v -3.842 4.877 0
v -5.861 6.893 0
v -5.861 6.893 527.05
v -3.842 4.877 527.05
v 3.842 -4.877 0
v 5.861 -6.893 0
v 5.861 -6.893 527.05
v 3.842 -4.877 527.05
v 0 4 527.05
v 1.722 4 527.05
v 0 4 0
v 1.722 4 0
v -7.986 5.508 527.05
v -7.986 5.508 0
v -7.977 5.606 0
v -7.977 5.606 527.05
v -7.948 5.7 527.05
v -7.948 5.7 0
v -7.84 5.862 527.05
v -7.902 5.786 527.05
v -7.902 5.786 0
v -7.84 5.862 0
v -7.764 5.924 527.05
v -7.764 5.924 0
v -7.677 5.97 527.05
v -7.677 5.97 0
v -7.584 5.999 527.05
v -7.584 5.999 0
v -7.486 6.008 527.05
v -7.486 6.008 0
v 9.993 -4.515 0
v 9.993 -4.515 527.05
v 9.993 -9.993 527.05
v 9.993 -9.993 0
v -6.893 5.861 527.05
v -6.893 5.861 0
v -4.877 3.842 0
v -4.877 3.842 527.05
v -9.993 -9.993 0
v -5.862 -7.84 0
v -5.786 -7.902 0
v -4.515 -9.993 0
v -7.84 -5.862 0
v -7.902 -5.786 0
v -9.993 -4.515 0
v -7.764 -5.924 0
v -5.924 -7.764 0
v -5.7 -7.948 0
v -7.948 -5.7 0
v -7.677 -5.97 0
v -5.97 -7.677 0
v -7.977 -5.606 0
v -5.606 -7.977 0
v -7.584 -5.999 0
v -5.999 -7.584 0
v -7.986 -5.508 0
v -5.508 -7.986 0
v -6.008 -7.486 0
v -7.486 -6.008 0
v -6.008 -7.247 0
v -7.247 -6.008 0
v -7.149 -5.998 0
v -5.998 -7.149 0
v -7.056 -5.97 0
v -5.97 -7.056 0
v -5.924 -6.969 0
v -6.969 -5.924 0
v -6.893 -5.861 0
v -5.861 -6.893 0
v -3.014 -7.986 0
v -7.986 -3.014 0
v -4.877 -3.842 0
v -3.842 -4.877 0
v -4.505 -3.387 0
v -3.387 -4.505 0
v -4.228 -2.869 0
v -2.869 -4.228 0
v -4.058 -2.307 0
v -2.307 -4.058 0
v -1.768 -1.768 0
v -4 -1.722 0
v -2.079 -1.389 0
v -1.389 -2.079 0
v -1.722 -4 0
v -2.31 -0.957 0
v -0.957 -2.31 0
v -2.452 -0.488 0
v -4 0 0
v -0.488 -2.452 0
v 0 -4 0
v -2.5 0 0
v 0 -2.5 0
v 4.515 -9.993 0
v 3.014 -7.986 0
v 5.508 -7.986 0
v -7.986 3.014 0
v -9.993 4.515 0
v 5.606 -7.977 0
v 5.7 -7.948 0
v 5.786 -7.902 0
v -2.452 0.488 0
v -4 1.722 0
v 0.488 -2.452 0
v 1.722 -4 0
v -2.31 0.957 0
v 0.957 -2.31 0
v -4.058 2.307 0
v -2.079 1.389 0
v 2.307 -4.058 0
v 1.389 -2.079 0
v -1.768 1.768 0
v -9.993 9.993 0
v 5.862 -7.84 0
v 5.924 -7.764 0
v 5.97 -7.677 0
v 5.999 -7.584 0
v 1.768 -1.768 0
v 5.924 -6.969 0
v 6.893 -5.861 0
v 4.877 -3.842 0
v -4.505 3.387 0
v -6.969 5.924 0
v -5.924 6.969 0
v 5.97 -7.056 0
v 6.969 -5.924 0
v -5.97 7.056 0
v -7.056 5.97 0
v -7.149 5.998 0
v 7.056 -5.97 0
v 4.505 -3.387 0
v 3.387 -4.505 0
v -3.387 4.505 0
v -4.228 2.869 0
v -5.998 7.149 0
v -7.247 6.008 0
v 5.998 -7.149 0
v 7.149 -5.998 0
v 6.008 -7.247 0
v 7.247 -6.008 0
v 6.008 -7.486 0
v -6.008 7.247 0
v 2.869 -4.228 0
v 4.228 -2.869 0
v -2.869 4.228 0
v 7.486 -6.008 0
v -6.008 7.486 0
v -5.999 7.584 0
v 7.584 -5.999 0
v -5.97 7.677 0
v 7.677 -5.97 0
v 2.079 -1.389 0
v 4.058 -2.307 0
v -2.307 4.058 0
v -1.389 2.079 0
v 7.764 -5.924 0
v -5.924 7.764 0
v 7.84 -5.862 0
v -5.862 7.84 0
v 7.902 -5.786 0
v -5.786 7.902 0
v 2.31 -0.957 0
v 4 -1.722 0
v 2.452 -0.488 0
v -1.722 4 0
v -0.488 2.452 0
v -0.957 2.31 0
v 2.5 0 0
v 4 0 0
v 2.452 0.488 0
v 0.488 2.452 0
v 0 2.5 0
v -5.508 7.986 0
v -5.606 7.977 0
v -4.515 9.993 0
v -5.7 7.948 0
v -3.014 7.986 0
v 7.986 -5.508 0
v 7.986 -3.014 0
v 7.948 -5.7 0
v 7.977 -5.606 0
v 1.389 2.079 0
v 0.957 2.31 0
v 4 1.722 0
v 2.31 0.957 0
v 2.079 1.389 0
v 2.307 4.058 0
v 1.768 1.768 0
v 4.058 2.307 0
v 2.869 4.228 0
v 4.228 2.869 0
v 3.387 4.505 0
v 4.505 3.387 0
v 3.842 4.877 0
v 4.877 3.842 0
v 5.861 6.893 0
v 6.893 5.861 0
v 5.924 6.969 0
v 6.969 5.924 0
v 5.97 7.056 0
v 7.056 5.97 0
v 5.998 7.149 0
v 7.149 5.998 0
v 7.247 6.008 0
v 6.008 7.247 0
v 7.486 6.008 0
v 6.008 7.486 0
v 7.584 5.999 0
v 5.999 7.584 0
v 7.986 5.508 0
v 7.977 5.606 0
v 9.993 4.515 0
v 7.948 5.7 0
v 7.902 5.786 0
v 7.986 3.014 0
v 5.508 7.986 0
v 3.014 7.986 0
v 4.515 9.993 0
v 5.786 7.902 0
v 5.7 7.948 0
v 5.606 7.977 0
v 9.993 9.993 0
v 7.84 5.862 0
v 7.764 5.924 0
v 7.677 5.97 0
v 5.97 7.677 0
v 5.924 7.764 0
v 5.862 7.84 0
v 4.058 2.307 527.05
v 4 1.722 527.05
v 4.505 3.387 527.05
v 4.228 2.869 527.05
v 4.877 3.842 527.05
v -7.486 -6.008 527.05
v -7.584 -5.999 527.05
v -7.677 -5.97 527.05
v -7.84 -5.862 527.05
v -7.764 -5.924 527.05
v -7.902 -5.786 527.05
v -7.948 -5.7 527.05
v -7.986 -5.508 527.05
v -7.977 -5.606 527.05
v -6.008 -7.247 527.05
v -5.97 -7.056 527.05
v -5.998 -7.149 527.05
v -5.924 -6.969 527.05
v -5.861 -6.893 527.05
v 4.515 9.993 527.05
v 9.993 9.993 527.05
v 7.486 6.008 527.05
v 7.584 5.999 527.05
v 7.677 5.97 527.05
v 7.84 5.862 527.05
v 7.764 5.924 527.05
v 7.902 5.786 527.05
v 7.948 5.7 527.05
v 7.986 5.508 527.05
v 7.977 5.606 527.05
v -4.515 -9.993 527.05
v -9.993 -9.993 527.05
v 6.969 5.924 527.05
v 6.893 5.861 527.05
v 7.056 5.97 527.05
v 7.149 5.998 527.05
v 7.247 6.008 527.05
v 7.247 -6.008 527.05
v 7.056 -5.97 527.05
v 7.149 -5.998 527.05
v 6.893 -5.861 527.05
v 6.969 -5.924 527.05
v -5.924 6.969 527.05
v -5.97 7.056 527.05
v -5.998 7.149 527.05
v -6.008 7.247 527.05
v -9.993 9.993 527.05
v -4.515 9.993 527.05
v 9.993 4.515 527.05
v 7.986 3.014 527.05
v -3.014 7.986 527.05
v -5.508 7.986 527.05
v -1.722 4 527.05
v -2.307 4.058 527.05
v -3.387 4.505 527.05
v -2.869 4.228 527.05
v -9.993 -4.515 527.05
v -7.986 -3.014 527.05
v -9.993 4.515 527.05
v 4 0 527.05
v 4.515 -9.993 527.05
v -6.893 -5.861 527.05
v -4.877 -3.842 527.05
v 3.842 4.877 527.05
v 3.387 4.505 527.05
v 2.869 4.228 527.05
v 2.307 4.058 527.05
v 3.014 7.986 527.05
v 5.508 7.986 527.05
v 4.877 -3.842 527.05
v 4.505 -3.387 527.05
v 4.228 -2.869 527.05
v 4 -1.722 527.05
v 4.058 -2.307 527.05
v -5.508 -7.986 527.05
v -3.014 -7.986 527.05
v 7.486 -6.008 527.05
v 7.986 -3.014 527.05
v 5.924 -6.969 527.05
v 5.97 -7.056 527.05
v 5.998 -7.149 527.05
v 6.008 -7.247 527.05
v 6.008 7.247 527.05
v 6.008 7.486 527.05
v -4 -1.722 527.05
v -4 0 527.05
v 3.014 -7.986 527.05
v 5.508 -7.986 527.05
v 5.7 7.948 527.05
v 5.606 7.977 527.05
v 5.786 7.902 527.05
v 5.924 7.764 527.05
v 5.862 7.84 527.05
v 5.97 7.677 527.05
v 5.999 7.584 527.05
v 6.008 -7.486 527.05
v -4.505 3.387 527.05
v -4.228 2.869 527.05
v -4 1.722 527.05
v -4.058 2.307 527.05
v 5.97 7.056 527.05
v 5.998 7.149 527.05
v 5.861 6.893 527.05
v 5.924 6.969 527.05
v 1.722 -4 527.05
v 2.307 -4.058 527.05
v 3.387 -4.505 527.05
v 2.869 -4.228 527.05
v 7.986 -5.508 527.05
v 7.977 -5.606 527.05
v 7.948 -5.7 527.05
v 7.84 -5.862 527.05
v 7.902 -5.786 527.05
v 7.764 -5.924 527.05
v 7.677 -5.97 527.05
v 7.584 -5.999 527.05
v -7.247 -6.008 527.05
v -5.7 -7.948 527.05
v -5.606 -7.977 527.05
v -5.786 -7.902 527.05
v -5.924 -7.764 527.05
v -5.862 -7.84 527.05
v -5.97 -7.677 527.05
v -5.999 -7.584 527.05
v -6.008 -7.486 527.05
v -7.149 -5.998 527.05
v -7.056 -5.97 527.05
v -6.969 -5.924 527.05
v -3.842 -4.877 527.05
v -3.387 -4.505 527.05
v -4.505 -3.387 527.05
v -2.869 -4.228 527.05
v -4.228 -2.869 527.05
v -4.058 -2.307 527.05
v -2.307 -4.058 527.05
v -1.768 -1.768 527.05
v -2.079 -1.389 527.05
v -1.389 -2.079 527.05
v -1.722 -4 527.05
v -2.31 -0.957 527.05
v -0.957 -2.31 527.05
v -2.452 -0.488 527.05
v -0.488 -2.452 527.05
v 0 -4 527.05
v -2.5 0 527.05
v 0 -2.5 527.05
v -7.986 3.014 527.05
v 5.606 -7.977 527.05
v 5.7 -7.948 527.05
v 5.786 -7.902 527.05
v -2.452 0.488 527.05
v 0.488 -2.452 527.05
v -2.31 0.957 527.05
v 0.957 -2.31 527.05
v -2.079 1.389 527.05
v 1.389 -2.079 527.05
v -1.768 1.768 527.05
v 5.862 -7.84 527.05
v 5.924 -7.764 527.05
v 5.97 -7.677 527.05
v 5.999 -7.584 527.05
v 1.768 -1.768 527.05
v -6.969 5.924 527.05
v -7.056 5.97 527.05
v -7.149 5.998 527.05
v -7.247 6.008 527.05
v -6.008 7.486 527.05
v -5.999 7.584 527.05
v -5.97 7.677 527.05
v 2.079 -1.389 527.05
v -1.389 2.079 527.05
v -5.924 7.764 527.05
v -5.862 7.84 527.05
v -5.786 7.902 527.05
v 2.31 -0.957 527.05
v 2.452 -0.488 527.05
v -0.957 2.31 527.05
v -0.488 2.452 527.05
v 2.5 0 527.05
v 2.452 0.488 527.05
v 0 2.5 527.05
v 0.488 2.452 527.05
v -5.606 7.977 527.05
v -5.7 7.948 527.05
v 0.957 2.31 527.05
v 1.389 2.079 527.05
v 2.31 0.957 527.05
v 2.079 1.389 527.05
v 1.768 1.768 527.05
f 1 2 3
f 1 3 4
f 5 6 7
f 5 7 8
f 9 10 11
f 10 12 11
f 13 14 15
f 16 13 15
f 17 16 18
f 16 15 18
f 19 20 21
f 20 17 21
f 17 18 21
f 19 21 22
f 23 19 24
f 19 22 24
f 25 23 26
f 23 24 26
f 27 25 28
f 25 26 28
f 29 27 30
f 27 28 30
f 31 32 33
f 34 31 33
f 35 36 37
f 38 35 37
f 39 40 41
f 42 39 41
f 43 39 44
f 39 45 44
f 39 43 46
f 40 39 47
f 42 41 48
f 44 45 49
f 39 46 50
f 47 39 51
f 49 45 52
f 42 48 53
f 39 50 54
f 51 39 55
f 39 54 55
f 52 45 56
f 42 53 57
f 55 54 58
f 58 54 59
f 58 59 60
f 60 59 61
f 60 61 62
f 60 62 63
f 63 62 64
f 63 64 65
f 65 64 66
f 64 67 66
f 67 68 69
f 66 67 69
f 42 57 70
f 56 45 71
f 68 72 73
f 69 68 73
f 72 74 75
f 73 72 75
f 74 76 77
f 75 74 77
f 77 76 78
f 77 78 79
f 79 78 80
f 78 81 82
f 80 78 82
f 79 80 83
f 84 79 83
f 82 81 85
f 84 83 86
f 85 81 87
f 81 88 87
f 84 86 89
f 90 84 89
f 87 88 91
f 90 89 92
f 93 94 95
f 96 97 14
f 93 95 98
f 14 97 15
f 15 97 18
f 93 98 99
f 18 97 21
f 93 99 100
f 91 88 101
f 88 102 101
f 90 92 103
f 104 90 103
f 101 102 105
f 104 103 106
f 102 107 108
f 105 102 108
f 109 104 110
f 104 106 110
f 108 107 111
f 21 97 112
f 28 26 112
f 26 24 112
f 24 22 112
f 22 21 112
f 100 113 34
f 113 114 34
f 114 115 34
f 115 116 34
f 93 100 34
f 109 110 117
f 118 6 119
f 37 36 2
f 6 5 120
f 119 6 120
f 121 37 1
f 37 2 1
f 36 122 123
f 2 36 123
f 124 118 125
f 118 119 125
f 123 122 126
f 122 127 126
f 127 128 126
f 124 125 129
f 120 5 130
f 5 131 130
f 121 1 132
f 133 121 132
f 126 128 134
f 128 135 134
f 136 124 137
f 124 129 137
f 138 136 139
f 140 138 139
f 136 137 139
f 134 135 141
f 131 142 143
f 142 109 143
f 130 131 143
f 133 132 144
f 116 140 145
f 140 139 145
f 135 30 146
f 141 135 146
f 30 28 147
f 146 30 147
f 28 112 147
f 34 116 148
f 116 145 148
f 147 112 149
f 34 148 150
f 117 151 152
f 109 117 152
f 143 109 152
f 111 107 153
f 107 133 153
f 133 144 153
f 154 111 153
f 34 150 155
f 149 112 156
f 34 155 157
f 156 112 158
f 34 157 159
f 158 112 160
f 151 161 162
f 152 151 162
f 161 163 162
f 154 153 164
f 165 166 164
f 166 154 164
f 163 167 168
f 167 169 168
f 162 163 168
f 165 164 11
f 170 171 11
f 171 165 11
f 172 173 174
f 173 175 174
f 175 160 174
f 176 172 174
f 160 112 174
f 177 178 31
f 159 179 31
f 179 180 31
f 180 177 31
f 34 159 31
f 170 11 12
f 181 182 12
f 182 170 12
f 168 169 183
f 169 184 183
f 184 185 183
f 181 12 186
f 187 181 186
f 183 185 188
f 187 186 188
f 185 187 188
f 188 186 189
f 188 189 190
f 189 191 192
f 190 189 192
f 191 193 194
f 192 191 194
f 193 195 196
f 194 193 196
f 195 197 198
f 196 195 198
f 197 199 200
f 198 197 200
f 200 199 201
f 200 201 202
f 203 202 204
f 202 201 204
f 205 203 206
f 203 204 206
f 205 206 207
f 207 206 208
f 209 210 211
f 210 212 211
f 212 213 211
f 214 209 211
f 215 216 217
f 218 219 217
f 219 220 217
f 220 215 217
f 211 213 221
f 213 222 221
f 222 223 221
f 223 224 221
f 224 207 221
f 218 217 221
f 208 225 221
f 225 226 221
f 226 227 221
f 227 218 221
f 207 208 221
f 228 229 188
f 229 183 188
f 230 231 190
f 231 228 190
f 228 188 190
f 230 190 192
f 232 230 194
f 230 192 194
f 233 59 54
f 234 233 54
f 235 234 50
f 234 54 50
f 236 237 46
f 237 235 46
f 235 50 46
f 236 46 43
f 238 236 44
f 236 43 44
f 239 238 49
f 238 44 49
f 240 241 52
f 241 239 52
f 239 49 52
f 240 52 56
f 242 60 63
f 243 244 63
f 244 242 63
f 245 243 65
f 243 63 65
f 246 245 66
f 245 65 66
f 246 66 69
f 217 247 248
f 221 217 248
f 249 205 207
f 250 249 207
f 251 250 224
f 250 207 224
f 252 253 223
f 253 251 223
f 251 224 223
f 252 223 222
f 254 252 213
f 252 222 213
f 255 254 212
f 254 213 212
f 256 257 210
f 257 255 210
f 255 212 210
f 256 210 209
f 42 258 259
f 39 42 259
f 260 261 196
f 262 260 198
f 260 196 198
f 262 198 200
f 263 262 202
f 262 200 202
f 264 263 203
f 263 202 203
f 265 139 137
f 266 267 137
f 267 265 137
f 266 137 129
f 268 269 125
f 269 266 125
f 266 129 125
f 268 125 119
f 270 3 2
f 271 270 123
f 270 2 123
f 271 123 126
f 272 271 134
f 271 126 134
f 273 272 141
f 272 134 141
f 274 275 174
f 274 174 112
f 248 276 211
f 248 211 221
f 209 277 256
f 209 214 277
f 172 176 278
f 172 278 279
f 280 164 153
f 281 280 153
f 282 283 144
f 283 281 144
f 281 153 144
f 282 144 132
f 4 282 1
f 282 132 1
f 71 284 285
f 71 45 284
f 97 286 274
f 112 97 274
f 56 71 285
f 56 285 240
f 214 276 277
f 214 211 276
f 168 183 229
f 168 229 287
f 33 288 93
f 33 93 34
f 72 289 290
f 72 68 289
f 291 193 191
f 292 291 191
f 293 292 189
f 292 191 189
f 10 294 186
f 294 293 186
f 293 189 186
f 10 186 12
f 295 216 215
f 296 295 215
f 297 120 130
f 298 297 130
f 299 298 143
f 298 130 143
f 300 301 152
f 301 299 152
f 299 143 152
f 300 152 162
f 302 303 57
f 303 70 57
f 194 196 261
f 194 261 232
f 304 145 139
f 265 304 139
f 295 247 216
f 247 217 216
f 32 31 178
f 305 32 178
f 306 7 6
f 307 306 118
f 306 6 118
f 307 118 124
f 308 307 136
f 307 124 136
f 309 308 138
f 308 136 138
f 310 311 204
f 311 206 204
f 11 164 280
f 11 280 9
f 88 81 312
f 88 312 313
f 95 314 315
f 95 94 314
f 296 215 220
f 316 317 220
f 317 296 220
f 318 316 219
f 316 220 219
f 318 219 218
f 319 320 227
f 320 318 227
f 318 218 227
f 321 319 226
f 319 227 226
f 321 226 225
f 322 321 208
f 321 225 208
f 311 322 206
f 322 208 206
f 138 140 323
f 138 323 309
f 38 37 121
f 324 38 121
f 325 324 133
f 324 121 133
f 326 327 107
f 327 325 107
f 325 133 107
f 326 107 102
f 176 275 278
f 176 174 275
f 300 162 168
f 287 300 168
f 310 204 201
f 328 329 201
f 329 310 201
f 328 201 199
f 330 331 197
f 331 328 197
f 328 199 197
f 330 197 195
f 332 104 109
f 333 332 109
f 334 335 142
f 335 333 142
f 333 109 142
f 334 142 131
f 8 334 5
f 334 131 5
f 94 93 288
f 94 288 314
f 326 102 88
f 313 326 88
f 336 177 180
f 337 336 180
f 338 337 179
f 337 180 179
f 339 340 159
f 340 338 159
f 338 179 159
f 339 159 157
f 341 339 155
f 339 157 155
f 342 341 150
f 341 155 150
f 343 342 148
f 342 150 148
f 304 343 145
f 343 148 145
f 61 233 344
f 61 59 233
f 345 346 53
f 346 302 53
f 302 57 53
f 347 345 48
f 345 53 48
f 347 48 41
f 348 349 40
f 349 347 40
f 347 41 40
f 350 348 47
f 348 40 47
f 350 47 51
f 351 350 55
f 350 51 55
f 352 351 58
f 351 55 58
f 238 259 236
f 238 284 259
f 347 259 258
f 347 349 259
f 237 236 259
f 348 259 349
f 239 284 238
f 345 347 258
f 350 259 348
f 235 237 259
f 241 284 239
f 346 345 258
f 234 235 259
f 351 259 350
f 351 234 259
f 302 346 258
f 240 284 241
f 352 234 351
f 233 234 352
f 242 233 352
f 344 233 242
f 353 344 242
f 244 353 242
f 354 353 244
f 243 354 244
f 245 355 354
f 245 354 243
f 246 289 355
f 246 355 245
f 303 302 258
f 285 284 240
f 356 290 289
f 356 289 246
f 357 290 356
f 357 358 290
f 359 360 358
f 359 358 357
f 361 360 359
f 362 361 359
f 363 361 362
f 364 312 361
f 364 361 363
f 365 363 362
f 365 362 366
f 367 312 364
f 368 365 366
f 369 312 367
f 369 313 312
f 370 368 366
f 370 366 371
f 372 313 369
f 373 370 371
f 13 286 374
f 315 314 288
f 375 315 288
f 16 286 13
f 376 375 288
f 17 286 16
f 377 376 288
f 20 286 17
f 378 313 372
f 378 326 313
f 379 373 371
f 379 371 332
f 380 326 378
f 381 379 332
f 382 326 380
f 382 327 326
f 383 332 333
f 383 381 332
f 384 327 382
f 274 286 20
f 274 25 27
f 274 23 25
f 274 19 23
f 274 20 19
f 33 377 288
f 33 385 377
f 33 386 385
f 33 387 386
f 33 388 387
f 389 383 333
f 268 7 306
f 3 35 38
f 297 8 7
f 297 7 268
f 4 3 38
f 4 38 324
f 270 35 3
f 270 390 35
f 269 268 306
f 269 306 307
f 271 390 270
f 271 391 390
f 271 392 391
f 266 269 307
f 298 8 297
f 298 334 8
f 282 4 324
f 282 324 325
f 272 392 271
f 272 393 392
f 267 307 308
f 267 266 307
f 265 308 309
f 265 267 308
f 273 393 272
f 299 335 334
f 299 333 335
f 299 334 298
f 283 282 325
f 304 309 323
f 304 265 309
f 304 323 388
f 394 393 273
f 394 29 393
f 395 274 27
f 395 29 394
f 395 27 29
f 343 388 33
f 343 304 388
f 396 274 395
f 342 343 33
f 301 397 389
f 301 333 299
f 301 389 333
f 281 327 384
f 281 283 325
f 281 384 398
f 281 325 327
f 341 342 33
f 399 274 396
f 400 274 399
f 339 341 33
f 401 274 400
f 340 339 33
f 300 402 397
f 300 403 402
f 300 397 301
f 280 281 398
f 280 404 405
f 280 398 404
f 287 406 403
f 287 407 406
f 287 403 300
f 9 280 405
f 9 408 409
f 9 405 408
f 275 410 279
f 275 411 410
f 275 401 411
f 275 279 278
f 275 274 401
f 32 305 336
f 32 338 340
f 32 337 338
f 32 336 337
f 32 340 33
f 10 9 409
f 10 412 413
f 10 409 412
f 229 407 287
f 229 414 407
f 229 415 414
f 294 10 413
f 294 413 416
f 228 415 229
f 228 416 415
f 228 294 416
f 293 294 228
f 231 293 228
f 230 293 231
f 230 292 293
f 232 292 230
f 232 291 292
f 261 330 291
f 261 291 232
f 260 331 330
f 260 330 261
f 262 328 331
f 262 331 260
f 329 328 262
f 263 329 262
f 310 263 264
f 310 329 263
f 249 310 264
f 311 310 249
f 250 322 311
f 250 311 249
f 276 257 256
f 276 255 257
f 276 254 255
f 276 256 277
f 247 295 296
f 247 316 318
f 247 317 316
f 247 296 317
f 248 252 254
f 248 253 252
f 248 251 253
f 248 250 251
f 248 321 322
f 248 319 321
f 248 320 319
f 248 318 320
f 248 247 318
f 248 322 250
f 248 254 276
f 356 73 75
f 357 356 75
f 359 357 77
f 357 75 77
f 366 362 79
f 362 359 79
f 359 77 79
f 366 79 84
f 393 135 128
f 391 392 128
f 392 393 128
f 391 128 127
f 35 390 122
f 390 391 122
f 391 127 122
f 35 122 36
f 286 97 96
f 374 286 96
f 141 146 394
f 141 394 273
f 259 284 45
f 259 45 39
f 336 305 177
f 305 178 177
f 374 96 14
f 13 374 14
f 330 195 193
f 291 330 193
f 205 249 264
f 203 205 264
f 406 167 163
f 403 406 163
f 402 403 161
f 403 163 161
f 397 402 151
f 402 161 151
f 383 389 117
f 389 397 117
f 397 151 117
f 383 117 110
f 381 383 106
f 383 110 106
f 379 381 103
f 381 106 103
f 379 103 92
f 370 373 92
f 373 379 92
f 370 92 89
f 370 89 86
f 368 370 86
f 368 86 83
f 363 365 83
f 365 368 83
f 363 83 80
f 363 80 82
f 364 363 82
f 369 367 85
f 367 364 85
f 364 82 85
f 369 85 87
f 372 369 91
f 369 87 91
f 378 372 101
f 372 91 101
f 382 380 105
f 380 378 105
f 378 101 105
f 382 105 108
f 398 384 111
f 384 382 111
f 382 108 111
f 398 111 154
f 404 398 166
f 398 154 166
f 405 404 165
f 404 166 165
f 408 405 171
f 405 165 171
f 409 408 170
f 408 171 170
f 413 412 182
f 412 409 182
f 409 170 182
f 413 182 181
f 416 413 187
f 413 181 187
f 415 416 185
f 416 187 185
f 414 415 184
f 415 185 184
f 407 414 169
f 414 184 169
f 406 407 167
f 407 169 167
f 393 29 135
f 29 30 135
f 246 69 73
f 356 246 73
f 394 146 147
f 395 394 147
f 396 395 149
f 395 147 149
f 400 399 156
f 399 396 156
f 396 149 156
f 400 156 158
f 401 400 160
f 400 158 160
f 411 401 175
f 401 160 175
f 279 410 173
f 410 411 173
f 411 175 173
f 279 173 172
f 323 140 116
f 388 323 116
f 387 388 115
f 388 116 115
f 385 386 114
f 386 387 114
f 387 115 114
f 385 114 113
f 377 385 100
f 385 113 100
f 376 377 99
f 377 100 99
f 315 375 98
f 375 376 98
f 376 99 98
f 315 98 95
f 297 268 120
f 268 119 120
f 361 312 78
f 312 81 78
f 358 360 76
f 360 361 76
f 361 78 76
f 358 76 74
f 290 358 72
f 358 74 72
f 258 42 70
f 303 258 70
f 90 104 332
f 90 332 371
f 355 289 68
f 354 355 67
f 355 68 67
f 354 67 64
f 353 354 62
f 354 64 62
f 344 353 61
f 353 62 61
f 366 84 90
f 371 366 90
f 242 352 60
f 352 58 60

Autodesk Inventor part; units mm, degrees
ref_plane "YZ Plane" through (0, 0, 0) normal (1, 0, 0) x (0, 1, 0)
ref_plane "XZ Plane" through (0, 0, 0) normal (0, 1, 0) x (-1, 0, 0)
ref_plane "XY Plane" through (0, 0, 0) normal (0, 0, 1) x (1, 0, 0)
sketch "Sketch1" plane through (0, 0, 0) normal (0, 0, 1) x (1, 0, 0)
  circle A0 centre (0, 0) radius 2.5
  line L0 (-9.9932, 4.515) -> (-7.9864, 3.0135)
  line L1 (-7.486, 6.0081) -> (-7.2469, 6.008)
  line L2 (-6.8934, 5.8613) -> (-4.8771, 3.8419)
  arc A1 (-6.8934, 5.8613) -> (-7.2469, 6.008) centre (-7.2472, 5.508) ccw
  circle A2 centre (0, 0) radius 2.5
  line L3 (-9.9932, 4.515) -> (-9.9932, 9.9932)
  line L4 (-7.9864, 3.0135) -> (-7.9864, 5.5081)
  arc A3 (-7.486, 6.0081) -> (-7.9864, 5.5081) centre (-7.4864, 5.5081) ccw
  line L5 (-4, 1.7222) -> (-4, 0)
  line L6 (-9.9932, -4.515) -> (-7.9864, -3.0135)
  line L7 (-6.8934, -5.8613) -> (-4.8771, -3.8419)
  arc A4 (-7.2469, -6.008) -> (-6.8934, -5.8613) centre (-7.2472, -5.508) ccw
  line L8 (-7.486, -6.0081) -> (-7.2469, -6.008)
  line L9 (-9.9932, -4.515) -> (-9.9932, -9.9932)
  line L10 (-7.9864, -3.0135) -> (-7.9864, -5.5081)
  arc A5 (-7.9864, -5.5081) -> (-7.486, -6.0081) centre (-7.4864, -5.5081) ccw
  line L11 (-4, -1.7222) -> (-4, 0)
  line L12 (9.9932, 4.515) -> (7.9864, 3.0135)
  line L13 (6.8934, 5.8613) -> (4.8771, 3.8419)
  arc A6 (7.2469, 6.008) -> (6.8934, 5.8613) centre (7.2472, 5.508) ccw
  line L14 (7.486, 6.0081) -> (7.2469, 6.008)
  line L15 (9.9932, 4.515) -> (9.9932, 9.9932)
  line L16 (7.9864, 3.0135) -> (7.9864, 5.5081)
  arc A7 (7.9864, 5.5081) -> (7.486, 6.0081) centre (7.4864, 5.5081) ccw
  line L17 (4, 1.7222) -> (4, 0)
  line L18 (9.9932, -4.515) -> (7.9864, -3.0135)
  line L19 (6.8934, -5.8613) -> (4.8771, -3.8419)
  arc A8 (6.8934, -5.8613) -> (7.2469, -6.008) centre (7.2472, -5.508) ccw
  line L20 (7.486, -6.0081) -> (7.2469, -6.008)
  line L21 (9.9932, -4.515) -> (9.9932, -9.9932)
  line L22 (7.9864, -3.0135) -> (7.9864, -5.5081)
  arc A9 (7.486, -6.0081) -> (7.9864, -5.5081) centre (7.4864, -5.5081) ccw
  line L23 (4, -1.7222) -> (4, 0)
  circle A10 centre (0, 0) radius 2.5
  line L24 (-4.515, -9.9932) -> (-3.0135, -7.9864)
  line L25 (-5.8613, -6.8934) -> (-3.8419, -4.8771)
  arc A11 (-5.8613, -6.8934) -> (-6.008, -7.2469) centre (-5.508, -7.2472) ccw
  line L26 (-6.0081, -7.486) -> (-6.008, -7.2469)
  circle A12 centre (0, 0) radius 2.5
  line L27 (-4.515, -9.9932) -> (-9.9932, -9.9932)
  line L28 (-3.0135, -7.9864) -> (-5.5081, -7.9864)
  arc A13 (-6.0081, -7.486) -> (-5.5081, -7.9864) centre (-5.5081, -7.4864) ccw
  line L29 (-1.7222, -4) -> (0, -4)
  line L30 (4.515, -9.9932) -> (3.0135, -7.9864)
  line L31 (5.8613, -6.8934) -> (3.8419, -4.8771)
  arc A14 (6.008, -7.2469) -> (5.8613, -6.8934) centre (5.508, -7.2472) ccw
  line L32 (6.0081, -7.486) -> (6.008, -7.2469)
  line L33 (4.515, -9.9932) -> (9.9932, -9.9932)
  line L34 (3.0135, -7.9864) -> (5.5081, -7.9864)
  arc A15 (5.5081, -7.9864) -> (6.0081, -7.486) centre (5.5081, -7.4864) ccw
  line L35 (1.7222, -4) -> (0, -4)
  line L36 (-1.7222, 4) -> (0, 4)
  line L37 (1.7222, 4) -> (0, 4)
  line L38 (5.8613, 6.8934) -> (3.8419, 4.8771)
  arc A16 (5.8613, 6.8934) -> (6.008, 7.2469) centre (5.508, 7.2472) ccw
  line L39 (6.0081, 7.486) -> (6.008, 7.2469)
  line L40 (3.0135, 7.9864) -> (5.5081, 7.9864)
  arc A17 (6.0081, 7.486) -> (5.5081, 7.9864) centre (5.5081, 7.4864) ccw
  line L41 (4.515, 9.9932) -> (3.0135, 7.9864)
  line L42 (4.515, 9.9932) -> (9.9932, 9.9932)
  line L43 (-5.8613, 6.8934) -> (-3.8419, 4.8771)
  arc A18 (-6.008, 7.2469) -> (-5.8613, 6.8934) centre (-5.508, 7.2472) ccw
  line L44 (-6.0081, 7.486) -> (-6.008, 7.2469)
  line L45 (-3.0135, 7.9864) -> (-5.5081, 7.9864)
  arc A19 (-5.5081, 7.9864) -> (-6.0081, 7.486) centre (-5.5081, 7.4864) ccw
  line L46 (-4.515, 9.9932) -> (-3.0135, 7.9864)
  line L47 (-4.515, 9.9932) -> (-9.9932, 9.9932)
  arc A20 (1.7222, 4) -> (3.8419, 4.8771) centre (1.7222, 7) ccw
  arc A21 (-3.8419, 4.8771) -> (-1.7222, 4) centre (-1.7222, 7) ccw
  arc A22 (-4, 1.7222) -> (-4.8771, 3.8419) centre (-7, 1.7222) ccw
  arc A23 (-4.8771, -3.8419) -> (-4, -1.7222) centre (-7, -1.7222) ccw
  arc A24 (-1.7222, -4) -> (-3.8419, -4.8771) centre (-1.7222, -7) ccw
  arc A25 (3.8419, -4.8771) -> (1.7222, -4) centre (1.7222, -7) ccw
  arc A26 (4, -1.7222) -> (4.8771, -3.8419) centre (7, -1.7222) ccw
  arc A27 (4.8771, 3.8419) -> (4, 1.7222) centre (7, 1.7222) ccw
  point P0 (-7.9864, 6.0085)
  point P1 (-7.9864, -6.0085)
  point P2 (7.9864, 6.0085)
  point P3 (7.9864, -6.0085)
  point P4 (-6.0085, -7.9864)
  point P5 (6.0085, -7.9864)
  point P6 (6.0085, 7.9864)
  point P7 (-6.0085, 7.9864)
extrude "Extrusion9" add sketch "Sketch1" along normal blind 527.05
properties part number "20mm_V-Rail_Extrusion Template" material "6105-T5 Aluminum"
